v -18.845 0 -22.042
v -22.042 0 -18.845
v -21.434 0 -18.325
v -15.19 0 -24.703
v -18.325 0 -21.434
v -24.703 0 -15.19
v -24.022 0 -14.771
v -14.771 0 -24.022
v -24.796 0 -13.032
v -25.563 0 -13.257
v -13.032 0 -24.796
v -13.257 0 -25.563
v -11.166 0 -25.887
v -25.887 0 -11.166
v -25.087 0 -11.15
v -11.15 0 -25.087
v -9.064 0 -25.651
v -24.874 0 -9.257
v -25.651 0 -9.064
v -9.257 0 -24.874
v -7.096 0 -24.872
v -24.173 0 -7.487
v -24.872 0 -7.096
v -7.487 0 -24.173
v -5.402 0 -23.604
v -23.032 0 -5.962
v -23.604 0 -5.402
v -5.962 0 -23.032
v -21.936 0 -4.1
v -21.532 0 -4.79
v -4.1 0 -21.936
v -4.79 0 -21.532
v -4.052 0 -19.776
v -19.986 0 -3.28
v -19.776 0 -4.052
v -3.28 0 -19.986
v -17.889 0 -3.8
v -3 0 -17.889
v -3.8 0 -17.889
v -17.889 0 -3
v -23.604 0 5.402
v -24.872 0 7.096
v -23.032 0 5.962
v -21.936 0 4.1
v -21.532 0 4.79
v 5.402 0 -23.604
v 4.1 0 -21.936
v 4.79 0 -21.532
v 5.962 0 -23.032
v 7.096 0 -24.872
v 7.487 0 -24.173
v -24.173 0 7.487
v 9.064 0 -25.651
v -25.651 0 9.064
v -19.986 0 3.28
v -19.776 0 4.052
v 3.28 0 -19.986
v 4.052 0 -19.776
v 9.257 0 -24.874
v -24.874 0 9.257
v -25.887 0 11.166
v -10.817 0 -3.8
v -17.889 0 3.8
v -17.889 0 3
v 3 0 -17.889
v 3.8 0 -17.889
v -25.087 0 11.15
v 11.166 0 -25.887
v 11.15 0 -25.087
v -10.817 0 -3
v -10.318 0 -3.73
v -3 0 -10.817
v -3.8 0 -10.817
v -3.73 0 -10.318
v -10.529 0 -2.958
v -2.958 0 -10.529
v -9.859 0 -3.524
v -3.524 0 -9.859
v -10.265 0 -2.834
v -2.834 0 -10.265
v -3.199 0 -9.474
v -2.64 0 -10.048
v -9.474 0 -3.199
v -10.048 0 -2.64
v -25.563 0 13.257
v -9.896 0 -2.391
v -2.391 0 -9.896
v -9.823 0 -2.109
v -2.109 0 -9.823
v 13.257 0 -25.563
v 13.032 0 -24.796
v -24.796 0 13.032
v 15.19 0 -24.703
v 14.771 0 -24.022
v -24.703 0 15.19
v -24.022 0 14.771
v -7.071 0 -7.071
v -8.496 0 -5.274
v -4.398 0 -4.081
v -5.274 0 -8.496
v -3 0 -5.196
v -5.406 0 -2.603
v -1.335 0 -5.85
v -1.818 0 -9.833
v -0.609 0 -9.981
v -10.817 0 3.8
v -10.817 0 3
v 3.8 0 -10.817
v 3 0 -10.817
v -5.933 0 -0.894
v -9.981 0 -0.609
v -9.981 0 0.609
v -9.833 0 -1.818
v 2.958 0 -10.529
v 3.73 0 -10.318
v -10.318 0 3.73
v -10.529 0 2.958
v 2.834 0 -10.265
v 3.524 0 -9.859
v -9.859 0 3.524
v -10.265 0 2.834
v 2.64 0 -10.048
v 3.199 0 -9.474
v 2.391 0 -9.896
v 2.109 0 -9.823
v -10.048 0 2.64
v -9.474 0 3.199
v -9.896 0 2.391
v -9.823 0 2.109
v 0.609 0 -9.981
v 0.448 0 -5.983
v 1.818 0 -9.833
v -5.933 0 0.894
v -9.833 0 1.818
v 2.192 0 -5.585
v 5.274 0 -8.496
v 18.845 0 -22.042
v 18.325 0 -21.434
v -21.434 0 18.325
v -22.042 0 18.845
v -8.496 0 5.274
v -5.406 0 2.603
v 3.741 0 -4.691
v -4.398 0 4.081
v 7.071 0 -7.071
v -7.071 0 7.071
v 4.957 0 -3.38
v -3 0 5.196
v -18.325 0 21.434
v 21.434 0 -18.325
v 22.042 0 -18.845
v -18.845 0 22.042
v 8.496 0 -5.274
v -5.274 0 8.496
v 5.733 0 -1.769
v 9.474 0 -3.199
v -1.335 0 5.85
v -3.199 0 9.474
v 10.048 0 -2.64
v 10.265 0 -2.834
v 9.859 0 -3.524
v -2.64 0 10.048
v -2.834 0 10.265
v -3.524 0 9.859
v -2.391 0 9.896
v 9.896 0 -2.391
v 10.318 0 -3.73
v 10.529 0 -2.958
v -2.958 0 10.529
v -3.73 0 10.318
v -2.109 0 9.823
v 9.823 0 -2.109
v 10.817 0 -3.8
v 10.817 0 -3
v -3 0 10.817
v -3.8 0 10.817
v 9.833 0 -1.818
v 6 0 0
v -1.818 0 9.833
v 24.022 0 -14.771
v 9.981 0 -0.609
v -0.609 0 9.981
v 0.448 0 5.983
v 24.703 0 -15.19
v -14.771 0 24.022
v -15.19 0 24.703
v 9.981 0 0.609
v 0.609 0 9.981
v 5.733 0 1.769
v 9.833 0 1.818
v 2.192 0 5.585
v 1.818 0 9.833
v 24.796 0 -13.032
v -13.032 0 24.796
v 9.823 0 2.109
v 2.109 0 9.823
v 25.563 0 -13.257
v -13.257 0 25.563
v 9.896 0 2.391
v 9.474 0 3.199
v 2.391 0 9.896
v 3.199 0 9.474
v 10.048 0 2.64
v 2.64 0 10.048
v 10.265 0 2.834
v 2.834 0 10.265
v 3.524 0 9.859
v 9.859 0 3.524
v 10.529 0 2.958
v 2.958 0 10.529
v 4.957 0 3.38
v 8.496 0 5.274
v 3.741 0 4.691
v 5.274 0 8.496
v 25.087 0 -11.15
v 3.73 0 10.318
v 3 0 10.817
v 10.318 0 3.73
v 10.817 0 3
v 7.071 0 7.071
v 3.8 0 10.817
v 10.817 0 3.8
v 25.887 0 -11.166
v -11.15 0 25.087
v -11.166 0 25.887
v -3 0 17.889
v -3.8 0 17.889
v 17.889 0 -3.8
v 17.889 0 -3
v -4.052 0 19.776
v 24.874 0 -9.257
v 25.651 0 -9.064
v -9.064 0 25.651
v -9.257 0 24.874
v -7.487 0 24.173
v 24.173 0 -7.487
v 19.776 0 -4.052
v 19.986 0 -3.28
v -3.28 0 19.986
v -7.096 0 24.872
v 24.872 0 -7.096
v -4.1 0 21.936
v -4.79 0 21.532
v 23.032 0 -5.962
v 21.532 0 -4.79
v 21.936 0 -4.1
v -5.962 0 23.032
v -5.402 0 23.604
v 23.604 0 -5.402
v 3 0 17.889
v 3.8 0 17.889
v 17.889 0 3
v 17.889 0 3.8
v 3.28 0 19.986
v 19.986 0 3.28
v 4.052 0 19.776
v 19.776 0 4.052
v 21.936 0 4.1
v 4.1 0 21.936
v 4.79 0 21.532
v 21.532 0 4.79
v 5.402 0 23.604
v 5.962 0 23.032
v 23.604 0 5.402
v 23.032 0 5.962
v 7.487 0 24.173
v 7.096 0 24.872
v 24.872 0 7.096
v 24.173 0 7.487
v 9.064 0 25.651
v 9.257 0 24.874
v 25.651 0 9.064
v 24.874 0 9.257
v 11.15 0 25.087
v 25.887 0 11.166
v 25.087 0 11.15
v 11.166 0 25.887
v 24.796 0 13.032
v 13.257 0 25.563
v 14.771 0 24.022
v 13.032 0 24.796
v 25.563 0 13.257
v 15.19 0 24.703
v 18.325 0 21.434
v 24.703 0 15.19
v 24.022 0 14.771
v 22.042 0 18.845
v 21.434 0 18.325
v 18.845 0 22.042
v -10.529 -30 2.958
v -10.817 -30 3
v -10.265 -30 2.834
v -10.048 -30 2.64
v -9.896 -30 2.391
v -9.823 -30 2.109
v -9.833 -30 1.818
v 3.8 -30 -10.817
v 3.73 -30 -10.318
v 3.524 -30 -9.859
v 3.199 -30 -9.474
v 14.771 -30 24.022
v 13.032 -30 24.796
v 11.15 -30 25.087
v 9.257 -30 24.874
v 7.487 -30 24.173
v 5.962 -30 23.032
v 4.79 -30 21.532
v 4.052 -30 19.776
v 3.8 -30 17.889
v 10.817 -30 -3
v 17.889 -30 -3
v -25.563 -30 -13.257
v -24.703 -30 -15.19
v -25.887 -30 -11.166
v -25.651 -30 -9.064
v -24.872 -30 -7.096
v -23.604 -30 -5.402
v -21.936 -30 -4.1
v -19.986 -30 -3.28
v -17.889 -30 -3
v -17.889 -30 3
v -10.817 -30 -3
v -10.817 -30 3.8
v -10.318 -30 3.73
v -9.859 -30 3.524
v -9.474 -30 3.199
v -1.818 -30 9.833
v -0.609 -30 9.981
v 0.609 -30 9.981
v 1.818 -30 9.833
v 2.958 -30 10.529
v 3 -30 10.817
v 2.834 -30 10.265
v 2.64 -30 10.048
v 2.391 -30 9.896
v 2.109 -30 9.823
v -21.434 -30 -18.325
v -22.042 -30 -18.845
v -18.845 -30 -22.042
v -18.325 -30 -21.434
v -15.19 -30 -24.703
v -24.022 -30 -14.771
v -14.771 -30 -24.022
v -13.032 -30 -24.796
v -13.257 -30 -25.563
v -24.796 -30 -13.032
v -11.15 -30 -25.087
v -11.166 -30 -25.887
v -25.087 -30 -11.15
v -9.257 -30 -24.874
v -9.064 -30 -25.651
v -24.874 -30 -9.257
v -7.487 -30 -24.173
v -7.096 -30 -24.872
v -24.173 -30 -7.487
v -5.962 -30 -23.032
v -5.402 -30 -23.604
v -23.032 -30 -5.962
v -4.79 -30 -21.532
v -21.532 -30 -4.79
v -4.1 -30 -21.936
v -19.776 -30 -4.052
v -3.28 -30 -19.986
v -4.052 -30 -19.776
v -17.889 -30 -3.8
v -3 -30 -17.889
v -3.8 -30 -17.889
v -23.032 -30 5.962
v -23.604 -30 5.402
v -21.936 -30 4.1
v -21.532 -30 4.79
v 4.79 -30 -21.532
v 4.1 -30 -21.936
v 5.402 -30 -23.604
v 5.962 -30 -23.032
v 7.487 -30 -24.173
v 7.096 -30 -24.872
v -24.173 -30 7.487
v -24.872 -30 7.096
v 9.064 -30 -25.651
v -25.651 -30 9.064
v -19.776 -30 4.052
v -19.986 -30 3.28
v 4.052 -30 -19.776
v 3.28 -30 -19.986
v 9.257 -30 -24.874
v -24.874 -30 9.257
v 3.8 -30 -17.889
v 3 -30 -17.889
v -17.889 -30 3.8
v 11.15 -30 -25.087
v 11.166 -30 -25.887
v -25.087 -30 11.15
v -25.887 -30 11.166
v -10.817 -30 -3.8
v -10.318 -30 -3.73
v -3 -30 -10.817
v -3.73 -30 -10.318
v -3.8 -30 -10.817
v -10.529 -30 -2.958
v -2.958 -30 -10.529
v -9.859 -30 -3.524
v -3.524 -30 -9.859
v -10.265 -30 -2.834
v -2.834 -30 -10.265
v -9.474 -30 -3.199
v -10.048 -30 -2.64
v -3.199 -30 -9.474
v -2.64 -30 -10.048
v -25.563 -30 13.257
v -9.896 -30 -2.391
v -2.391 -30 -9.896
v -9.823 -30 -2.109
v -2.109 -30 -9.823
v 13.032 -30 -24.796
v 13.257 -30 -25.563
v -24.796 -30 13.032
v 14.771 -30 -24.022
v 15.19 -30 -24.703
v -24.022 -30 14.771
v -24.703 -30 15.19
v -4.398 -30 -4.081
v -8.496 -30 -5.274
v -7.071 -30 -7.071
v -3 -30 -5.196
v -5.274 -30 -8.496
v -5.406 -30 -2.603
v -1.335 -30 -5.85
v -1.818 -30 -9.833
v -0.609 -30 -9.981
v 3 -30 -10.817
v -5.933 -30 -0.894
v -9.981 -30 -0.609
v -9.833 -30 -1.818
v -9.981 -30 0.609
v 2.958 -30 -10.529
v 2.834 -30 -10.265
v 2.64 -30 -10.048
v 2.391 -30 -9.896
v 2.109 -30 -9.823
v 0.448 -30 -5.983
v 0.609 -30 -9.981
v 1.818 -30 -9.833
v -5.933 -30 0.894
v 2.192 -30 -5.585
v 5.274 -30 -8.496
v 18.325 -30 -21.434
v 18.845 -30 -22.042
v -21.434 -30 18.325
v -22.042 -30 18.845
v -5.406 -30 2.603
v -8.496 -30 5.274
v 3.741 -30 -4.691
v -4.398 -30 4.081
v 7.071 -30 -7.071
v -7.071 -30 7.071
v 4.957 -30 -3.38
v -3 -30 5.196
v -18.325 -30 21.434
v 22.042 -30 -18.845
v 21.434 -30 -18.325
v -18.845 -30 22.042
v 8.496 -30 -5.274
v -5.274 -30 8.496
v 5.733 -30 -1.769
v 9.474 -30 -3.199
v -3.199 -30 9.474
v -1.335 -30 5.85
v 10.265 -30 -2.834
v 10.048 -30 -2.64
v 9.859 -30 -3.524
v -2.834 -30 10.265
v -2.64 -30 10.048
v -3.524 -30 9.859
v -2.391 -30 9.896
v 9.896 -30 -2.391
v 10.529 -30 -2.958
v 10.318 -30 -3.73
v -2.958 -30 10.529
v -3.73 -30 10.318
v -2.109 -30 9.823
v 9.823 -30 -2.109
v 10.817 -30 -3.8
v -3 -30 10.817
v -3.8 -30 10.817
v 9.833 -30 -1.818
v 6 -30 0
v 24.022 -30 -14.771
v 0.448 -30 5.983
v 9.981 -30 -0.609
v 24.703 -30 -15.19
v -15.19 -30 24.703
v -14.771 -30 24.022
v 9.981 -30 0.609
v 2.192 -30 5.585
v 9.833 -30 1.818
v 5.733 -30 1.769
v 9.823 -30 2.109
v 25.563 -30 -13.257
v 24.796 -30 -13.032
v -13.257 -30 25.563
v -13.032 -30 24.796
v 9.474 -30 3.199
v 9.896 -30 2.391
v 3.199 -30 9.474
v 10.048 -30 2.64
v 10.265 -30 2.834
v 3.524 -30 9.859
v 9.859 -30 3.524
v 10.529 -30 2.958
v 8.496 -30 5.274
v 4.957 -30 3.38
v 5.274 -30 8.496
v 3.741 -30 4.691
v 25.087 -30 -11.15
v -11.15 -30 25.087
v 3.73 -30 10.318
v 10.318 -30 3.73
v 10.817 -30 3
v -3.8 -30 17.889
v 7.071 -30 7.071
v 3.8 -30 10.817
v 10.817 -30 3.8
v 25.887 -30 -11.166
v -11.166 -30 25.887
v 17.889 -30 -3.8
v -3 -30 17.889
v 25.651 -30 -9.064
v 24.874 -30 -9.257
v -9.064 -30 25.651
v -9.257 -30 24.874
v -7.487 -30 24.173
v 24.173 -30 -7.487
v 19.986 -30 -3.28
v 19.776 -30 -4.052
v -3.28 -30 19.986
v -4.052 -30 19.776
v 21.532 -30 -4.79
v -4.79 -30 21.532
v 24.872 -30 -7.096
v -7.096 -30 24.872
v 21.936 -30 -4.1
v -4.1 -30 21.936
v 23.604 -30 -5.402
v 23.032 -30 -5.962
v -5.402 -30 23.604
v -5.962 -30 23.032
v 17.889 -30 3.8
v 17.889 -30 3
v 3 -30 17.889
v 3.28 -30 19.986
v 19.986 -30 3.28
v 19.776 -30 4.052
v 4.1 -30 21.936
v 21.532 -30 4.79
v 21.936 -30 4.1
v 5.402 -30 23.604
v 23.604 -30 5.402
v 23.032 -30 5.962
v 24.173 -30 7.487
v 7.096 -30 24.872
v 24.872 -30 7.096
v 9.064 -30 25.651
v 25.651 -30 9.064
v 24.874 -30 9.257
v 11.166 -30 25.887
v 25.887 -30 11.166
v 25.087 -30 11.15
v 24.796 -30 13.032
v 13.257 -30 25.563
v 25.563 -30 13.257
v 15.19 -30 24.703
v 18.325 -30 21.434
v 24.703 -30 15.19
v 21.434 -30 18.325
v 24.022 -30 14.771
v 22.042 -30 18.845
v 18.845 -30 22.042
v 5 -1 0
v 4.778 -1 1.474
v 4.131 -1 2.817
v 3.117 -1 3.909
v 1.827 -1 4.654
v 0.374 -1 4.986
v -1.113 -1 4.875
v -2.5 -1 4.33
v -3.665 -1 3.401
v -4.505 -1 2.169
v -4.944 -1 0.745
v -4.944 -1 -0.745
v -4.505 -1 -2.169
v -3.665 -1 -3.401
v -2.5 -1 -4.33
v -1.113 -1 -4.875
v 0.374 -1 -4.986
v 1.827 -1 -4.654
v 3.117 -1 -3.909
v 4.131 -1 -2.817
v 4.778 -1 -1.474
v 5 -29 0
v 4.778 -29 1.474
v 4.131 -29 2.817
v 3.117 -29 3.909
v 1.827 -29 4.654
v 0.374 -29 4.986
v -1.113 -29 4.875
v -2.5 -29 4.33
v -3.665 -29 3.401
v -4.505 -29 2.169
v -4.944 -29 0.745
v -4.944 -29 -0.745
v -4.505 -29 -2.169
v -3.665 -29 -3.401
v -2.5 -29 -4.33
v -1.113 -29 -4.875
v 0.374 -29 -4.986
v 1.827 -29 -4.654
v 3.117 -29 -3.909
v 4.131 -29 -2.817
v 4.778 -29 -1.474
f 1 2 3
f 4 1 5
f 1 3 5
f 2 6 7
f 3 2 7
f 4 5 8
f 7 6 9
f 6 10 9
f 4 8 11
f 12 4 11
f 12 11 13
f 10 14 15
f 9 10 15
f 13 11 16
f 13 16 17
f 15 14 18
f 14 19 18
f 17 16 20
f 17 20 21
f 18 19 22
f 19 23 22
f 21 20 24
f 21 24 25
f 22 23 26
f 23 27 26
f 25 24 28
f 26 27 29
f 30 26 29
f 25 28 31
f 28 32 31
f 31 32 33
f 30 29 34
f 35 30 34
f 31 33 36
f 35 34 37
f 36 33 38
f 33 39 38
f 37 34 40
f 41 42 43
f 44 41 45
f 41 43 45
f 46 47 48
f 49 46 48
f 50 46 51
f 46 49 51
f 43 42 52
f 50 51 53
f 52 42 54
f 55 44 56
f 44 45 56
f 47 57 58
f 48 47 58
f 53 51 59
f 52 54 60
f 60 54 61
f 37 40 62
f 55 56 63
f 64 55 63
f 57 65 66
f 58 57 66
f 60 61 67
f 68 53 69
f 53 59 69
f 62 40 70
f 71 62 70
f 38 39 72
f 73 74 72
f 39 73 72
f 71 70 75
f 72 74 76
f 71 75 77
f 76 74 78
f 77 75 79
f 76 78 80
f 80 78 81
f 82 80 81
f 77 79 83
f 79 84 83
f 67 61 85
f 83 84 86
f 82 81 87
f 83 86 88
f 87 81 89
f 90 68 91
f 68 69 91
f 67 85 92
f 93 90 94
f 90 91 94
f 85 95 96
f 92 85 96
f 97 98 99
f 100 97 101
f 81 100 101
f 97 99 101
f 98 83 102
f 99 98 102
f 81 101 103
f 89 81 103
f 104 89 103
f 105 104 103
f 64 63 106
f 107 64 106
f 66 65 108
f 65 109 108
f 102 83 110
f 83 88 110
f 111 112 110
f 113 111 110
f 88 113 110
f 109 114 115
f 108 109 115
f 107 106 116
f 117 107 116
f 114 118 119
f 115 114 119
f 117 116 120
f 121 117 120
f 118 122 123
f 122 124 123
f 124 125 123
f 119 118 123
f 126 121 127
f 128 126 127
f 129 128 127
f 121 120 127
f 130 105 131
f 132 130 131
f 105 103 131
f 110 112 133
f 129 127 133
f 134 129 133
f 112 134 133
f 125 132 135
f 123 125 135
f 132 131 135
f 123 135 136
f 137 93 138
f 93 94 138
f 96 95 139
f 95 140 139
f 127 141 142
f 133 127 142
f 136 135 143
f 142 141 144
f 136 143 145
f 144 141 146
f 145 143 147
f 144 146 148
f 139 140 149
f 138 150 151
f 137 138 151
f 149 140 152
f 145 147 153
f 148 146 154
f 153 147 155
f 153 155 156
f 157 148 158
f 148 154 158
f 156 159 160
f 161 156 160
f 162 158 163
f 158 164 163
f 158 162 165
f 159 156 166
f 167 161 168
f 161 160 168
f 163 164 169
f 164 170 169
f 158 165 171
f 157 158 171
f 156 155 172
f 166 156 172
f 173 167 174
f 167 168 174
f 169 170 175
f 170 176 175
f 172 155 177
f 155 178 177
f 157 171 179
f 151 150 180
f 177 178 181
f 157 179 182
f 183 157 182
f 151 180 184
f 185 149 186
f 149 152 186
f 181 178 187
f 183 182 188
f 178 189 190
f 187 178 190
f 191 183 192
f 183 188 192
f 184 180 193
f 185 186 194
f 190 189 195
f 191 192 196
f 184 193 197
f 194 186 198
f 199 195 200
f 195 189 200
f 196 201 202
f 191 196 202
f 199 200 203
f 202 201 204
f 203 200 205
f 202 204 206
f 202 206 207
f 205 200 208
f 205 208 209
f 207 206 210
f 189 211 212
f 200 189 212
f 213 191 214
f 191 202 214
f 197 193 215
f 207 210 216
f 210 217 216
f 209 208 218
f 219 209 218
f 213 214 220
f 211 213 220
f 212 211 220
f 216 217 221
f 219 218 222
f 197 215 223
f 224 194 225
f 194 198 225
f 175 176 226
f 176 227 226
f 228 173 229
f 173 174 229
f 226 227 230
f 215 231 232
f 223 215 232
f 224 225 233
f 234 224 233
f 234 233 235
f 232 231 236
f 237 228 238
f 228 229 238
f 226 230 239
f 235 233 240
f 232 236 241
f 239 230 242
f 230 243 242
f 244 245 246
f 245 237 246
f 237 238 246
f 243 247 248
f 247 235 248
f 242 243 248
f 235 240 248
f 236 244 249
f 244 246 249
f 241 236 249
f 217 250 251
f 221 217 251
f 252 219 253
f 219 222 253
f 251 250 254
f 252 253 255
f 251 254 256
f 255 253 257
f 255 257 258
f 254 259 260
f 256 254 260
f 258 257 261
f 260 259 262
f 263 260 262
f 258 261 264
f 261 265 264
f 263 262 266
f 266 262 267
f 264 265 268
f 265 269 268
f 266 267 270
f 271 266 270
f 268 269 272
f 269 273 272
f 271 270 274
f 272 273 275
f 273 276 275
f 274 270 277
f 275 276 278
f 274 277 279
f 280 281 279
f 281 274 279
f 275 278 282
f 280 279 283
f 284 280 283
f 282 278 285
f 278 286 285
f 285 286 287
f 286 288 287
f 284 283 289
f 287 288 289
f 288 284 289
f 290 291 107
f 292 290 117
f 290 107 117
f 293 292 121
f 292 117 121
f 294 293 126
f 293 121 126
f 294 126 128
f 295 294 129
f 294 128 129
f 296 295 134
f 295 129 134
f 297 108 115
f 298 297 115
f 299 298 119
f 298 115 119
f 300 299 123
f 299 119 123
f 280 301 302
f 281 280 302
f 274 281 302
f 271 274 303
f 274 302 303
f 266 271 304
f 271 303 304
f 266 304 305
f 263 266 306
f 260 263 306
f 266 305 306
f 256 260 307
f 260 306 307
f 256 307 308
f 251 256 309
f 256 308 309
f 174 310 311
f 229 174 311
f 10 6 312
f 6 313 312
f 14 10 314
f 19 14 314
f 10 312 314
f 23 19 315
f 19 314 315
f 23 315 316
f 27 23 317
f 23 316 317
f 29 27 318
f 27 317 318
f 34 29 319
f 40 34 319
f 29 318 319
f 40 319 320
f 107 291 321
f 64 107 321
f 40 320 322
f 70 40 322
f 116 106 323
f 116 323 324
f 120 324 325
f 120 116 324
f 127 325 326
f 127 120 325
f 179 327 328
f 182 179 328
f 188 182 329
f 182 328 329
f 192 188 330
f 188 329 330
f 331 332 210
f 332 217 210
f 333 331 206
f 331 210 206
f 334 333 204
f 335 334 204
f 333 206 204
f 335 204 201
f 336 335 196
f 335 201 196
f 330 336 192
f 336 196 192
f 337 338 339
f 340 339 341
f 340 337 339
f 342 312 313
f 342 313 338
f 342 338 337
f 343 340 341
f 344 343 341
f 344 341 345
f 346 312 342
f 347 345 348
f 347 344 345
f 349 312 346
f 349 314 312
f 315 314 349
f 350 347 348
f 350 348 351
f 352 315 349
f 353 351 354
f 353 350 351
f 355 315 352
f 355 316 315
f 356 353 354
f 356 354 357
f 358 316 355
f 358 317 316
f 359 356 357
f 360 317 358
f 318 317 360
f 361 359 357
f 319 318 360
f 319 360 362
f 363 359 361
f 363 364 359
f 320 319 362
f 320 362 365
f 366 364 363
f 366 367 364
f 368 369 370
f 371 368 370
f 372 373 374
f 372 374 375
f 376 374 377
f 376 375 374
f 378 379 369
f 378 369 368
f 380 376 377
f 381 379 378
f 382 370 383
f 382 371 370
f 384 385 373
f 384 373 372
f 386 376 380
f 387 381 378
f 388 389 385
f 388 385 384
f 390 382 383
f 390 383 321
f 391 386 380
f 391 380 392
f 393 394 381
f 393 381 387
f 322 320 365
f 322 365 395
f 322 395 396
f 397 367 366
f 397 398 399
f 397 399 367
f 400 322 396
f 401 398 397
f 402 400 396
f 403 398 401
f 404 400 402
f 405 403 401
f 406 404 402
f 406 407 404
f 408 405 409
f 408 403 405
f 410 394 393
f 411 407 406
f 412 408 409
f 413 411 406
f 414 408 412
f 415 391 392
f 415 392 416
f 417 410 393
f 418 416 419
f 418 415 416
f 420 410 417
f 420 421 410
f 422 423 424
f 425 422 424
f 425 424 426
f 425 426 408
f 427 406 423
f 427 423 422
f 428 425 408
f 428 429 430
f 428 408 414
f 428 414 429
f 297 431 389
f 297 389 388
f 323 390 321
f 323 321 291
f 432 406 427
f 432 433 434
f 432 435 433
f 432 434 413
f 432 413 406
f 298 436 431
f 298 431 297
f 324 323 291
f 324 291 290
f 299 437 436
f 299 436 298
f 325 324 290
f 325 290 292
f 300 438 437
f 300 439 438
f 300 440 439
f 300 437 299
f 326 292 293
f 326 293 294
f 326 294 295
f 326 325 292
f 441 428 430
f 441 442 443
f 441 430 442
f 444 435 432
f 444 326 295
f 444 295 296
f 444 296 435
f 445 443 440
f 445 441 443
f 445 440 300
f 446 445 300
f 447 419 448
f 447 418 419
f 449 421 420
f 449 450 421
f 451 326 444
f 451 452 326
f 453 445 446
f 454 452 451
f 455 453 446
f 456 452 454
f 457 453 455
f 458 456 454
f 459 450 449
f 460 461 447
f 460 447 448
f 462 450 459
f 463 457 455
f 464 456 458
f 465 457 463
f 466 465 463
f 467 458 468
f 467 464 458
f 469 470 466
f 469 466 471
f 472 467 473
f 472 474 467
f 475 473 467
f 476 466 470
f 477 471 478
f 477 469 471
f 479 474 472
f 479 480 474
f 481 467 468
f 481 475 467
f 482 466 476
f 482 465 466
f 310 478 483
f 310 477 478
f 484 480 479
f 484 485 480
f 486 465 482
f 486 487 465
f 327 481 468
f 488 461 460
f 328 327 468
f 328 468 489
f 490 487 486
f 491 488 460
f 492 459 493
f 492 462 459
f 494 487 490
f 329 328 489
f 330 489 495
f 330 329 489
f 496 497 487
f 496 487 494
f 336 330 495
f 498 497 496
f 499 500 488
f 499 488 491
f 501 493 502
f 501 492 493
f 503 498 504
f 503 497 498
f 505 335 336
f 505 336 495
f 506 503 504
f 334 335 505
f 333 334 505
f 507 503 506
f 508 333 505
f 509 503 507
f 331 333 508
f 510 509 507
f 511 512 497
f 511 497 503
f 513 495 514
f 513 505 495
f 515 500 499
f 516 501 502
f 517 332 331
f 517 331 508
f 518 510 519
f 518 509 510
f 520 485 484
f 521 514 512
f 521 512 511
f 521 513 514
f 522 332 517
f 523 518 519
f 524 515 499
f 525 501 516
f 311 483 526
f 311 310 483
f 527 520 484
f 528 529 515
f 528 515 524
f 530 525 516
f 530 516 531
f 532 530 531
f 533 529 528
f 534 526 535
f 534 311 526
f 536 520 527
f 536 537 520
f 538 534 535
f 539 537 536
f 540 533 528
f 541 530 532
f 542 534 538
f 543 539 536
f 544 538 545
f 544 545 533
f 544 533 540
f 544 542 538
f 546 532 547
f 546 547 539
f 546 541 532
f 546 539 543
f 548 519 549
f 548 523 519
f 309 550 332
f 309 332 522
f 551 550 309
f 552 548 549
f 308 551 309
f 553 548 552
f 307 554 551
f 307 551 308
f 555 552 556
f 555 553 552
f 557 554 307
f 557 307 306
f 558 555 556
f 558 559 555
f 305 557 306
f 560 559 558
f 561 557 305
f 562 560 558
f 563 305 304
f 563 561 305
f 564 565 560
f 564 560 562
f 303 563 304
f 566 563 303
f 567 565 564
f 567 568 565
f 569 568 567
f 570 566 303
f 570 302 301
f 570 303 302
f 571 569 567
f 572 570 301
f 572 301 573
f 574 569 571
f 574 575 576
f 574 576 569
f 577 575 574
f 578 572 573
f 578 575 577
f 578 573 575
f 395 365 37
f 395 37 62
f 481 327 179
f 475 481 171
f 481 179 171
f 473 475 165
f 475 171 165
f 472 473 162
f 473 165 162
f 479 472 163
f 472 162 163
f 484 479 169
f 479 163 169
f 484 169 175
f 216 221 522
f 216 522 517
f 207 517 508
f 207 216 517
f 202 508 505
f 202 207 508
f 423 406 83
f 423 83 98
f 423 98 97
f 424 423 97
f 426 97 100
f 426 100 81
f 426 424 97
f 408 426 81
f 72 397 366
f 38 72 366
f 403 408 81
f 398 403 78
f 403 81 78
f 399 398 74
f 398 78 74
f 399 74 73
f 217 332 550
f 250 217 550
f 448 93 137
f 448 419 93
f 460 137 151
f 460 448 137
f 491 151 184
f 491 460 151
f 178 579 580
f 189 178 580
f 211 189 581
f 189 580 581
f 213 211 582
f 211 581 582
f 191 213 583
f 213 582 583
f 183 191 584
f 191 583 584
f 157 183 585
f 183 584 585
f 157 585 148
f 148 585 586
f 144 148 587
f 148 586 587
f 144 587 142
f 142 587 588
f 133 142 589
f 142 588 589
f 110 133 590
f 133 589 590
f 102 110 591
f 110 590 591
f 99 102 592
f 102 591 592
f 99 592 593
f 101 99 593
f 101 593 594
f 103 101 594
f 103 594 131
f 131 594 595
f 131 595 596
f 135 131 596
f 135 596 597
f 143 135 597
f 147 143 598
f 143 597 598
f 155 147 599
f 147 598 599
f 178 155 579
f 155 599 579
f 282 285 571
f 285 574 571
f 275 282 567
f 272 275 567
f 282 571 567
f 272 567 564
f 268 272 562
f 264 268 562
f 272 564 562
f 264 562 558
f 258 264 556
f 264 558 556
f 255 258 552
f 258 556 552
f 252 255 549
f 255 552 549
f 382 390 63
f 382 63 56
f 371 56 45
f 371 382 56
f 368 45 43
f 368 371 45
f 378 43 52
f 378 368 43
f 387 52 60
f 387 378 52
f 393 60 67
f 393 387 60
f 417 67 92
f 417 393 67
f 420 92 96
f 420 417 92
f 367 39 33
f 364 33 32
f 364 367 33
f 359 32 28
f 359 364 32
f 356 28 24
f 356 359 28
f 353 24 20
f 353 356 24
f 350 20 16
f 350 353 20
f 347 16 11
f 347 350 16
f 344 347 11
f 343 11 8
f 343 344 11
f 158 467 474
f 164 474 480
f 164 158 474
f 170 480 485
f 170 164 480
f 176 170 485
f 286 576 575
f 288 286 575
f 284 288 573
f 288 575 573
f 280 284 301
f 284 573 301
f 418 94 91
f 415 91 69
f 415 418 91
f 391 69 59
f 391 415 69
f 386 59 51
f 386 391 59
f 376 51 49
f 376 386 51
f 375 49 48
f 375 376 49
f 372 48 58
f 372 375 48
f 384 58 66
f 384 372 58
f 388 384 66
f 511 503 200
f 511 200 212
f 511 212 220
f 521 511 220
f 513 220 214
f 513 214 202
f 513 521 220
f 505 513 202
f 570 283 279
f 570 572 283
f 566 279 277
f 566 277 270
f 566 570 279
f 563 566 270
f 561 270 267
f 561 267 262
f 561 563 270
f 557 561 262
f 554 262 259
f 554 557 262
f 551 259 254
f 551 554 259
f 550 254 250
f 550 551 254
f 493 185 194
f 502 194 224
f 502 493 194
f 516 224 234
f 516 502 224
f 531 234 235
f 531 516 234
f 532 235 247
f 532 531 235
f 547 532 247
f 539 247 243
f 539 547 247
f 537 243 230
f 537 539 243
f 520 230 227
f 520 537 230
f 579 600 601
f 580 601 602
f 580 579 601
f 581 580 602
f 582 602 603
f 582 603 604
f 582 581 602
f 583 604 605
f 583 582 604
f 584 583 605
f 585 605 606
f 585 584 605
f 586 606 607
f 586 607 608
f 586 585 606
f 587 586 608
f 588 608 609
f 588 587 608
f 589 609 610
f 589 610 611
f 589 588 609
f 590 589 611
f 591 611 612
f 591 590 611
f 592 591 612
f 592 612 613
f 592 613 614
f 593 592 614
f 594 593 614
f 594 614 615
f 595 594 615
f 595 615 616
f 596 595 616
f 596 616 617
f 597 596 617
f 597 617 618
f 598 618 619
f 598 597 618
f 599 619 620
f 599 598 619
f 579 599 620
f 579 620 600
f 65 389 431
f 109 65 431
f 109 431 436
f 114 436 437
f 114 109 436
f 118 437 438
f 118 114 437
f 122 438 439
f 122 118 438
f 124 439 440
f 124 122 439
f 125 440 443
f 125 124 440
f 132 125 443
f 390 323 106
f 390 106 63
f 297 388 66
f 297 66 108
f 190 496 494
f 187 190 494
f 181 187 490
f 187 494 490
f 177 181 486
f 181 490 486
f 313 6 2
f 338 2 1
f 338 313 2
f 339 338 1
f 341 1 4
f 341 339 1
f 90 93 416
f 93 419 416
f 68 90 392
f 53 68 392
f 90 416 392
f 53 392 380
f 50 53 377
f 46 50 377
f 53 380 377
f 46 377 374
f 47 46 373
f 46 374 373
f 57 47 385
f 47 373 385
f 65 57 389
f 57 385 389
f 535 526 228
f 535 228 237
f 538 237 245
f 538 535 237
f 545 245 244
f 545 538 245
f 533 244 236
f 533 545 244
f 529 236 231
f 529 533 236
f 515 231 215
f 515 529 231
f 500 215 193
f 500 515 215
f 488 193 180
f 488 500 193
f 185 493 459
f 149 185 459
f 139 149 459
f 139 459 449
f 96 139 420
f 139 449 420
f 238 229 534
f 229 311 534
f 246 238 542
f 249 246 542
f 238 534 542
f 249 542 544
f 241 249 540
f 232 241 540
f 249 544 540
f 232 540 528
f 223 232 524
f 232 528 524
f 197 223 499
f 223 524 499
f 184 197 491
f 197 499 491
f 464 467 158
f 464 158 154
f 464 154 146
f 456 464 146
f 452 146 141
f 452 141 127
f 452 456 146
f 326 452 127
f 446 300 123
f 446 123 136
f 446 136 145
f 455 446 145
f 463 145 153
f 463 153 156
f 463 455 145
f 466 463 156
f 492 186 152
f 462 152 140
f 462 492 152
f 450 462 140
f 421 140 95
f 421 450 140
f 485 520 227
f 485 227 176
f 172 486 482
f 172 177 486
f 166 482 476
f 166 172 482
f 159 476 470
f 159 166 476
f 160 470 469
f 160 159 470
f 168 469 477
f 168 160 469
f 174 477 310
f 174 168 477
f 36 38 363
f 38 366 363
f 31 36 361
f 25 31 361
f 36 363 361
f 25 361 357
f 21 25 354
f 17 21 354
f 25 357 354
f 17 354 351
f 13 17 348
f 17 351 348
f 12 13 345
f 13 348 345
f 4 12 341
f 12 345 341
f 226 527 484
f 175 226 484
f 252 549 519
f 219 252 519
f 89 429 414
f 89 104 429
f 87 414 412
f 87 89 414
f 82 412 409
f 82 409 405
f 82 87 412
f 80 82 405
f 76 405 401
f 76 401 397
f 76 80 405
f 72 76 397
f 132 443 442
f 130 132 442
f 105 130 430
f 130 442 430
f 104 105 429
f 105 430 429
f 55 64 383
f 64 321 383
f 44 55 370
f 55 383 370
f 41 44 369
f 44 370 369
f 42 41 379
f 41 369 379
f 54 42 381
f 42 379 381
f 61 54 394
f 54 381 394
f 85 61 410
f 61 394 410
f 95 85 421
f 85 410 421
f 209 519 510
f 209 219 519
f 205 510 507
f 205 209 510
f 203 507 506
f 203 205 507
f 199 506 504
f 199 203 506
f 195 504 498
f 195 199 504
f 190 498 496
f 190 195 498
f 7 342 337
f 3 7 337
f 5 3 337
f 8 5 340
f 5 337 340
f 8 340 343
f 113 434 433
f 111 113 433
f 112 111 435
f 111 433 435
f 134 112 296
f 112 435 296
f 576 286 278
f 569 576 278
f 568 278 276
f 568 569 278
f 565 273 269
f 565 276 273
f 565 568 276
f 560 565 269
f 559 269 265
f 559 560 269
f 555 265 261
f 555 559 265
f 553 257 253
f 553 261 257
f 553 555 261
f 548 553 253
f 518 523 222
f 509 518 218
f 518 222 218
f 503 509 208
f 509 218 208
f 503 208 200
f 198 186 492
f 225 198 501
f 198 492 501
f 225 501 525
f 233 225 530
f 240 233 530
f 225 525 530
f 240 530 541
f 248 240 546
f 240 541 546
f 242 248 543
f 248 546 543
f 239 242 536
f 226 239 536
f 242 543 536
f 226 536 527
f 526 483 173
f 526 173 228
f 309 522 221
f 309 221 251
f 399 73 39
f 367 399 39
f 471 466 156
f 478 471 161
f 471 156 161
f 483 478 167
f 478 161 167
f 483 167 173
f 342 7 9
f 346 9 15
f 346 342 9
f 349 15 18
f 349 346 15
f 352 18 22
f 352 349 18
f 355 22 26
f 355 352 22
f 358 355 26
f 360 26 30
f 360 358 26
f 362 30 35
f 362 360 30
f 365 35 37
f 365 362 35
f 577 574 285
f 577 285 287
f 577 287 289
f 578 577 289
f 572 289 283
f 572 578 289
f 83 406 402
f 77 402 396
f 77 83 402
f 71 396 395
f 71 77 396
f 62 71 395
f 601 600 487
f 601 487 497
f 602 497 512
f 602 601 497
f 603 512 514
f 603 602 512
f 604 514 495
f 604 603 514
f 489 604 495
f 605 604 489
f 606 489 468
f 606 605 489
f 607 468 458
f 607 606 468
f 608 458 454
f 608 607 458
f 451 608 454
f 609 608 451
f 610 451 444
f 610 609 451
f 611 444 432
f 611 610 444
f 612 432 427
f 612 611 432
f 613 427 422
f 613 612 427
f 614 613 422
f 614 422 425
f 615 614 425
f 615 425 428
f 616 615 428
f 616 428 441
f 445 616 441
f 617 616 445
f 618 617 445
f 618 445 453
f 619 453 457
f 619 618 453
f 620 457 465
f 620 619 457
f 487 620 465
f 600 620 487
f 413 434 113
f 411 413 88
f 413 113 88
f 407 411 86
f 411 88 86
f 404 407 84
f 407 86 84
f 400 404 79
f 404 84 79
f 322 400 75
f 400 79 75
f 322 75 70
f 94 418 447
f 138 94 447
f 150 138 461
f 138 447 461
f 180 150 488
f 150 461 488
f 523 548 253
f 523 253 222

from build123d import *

# Parameters (mm, degrees)
F0_R      = 10
F0_R_2    = 5
F1_DEPTH  = 30
F2_R      = 29
F2_R_2    = 10
F3_DEPTH  = 30
F5_DEPTH  = 30.001
F6_R      = 8
F7_R      = 1
F8_T      = -0.8
F9_DEPTH  = 25
F10_R     = 5.8
F10_R_2   = 5
F11_DEPTH = 30
F12_SIZE  = 1


with BuildPart() as f1:
    # F0 (on Front) → F1 (new body)
    with BuildSketch(Plane.XZ):
        Circle(F0_R)
        Circle(F0_R_2, mode=Mode.SUBTRACT)
    extrude(amount=F1_DEPTH)

    # F2 (on face) → F3 (join, through all)
    with BuildSketch(Plane.XZ.offset(30)):
        Circle(F2_R)
        Circle(F2_R_2, mode=Mode.SUBTRACT)
    extrude(amount=-F3_DEPTH)

    # F4 (on face) → F5 (cut, through all)
    with BuildSketch(Plane.XZ.offset(30)):
        with BuildLine():
            ThreePointArc((-9.5393920142, -3), (-10, 0), (-9.5393920142, 3))
            Line((-9.5393920142, 3), (-32.1717076004, 3))
            Line((-32.1717076004, 3), (-32.1717076004, -3))
            Line((-32.1717076004, -3), (-9.5393920142, -3))
        make_face()
        with BuildLine():
            Line((-3, -33.598061651), (3, -33.598061651))
            Line((3, -33.598061651), (3, -9.5393920142))
            ThreePointArc((3, -9.5393920142), (0, -10), (-3, -9.5393920142))
            Line((-3, -9.5393920142), (-3, -33.598061651))
        make_face()
        with BuildLine():
            Line((3, 9.5393920142), (3, 33.598061651))
            Line((3, 33.598061651), (-3, 33.598061651))
            Line((-3, 33.598061651), (-3, 9.5393920142))
            ThreePointArc((-3, 9.5393920142), (0, 10), (3, 9.5393920142))
        make_face()
        with BuildLine():
            Line((9.5393920142, -3), (32.1717076004, -3))
            Line((32.1717076004, -3), (32.1717076004, 3))
            Line((32.1717076004, 3), (9.5393920142, 3))
            ThreePointArc((9.5393920142, 3), (10, 0), (9.5393920142, -3))
        make_face()
    extrude(amount=-F5_DEPTH, mode=Mode.SUBTRACT)

    # F6
    f6_edges = [f1.edges().sort_by_distance(p)[0] for p in [
        (-3, -15, 28.84441),
        (-28.84441, -15, 3),
        (-28.84441, -15, -3),
        (3, -15, 28.84441),
        (-3, -15, -28.84441),
        (3, -15, -28.84441),
        (28.84441, -15, -3),
        (28.84441, -15, 3),
    ]]
    fillet(f6_edges, radius=F6_R)

    # F7
    f7_edges = [f1.edges().sort_by_distance(p)[0] for p in [
        (-9.539392, -15, 3),
        (-9.539392, -15, -3),
        (-3, -15, -9.539392),
        (3, -15, -9.539392),
        (9.539392, -15, 3),
        (9.539392, -15, -3),
        (-3, -15, 9.539392),
        (3, -15, 9.539392),
    ]]
    fillet(f7_edges, radius=F7_R)

    # F8
    f8_openings = [f1.faces().sort_by_distance(p)[0] for p in [
        (14.352599, -30, 3.732239),
    ]]
    offset(amount=F8_T, openings=f8_openings)

    # F9 (cut): faces of the model
    f9_faces = [f1.faces().sort_by_distance(p)[0] for p in [
        (14.3525988232, -0.8, 4.5096111786),
        (14.3525988232, -0.8, 4.5096111786),
        (14.3525988232, -0.8, 4.5096111786),
        (14.3525988232, -0.8, 4.5096111786),
    ]]
    extrude(f9_faces, amount=-F9_DEPTH, mode=Mode.SUBTRACT)

    # F10 (on face) → F11 (join, through all)
    with BuildSketch(Plane.XZ.offset(30)):
        with BuildLine():
            ThreePointArc((9.0466559275, 1.6727272727), (9.083408006, 2.4856530923), (9.4744050932, 3.1993199482))
            ThreePointArc((9.4744050932, 3.1993199482), (7.0710678119, 7.0710678119), (3.1993199482, 9.4744050932))
            ThreePointArc((3.1993199482, 9.4744050932), (2.4856530923, 9.083408006), (1.6727272727, 9.0466559275))
            ThreePointArc((1.6727272727, 9.0466559275), (0, 9.2), (-1.6727272727, 9.0466559275))
            ThreePointArc((-1.6727272727, 9.0466559275), (-2.4856530923, 9.083408006), (-3.1993199482, 9.4744050932))
            ThreePointArc((-3.1993199482, 9.4744050932), (-7.0710678119, 7.0710678119), (-9.4744050932, 3.1993199482))
            ThreePointArc((-9.4744050932, 3.1993199482), (-9.083408006, 2.4856530923), (-9.0466559275, 1.6727272727))
            ThreePointArc((-9.0466559275, 1.6727272727), (-9.2, 0), (-9.0466559275, -1.6727272727))
            ThreePointArc((-9.0466559275, -1.6727272727), (-9.083408006, -2.4856530923), (-9.4744050932, -3.1993199482))
            ThreePointArc((-9.4744050932, -3.1993199482), (-7.0710678119, -7.0710678119), (-3.1993199482, -9.4744050932))
            ThreePointArc((-3.1993199482, -9.4744050932), (-2.4856530923, -9.083408006), (-1.6727272727, -9.0466559275))
            ThreePointArc((-1.6727272727, -9.0466559275), (0, -9.2), (1.6727272727, -9.0466559275))
            ThreePointArc((1.6727272727, -9.0466559275), (2.4856530923, -9.083408006), (3.1993199482, -9.4744050932))
            ThreePointArc((3.1993199482, -9.4744050932), (7.0710678119, -7.0710678119), (9.4744050932, -3.1993199482))
            ThreePointArc((9.4744050932, -3.1993199482), (9.083408006, -2.4856530923), (9.0466559275, -1.6727272727))
            ThreePointArc((9.0466559275, -1.6727272727), (9.2, 0), (9.0466559275, 1.6727272727))
        make_face()
        Circle(F10_R, mode=Mode.SUBTRACT)
        Circle(F10_R)
        Circle(F10_R_2, mode=Mode.SUBTRACT)
    extrude(amount=-F11_DEPTH)

    # F12
    f12_edges = [f1.edges().sort_by_distance(p)[0] for p in [
        (5, -15, 0),
        (-5, 0, 0),
        (-5, -30, 0),
    ]]
    chamfer(f12_edges, length=F12_SIZE)


solid = f1.part
